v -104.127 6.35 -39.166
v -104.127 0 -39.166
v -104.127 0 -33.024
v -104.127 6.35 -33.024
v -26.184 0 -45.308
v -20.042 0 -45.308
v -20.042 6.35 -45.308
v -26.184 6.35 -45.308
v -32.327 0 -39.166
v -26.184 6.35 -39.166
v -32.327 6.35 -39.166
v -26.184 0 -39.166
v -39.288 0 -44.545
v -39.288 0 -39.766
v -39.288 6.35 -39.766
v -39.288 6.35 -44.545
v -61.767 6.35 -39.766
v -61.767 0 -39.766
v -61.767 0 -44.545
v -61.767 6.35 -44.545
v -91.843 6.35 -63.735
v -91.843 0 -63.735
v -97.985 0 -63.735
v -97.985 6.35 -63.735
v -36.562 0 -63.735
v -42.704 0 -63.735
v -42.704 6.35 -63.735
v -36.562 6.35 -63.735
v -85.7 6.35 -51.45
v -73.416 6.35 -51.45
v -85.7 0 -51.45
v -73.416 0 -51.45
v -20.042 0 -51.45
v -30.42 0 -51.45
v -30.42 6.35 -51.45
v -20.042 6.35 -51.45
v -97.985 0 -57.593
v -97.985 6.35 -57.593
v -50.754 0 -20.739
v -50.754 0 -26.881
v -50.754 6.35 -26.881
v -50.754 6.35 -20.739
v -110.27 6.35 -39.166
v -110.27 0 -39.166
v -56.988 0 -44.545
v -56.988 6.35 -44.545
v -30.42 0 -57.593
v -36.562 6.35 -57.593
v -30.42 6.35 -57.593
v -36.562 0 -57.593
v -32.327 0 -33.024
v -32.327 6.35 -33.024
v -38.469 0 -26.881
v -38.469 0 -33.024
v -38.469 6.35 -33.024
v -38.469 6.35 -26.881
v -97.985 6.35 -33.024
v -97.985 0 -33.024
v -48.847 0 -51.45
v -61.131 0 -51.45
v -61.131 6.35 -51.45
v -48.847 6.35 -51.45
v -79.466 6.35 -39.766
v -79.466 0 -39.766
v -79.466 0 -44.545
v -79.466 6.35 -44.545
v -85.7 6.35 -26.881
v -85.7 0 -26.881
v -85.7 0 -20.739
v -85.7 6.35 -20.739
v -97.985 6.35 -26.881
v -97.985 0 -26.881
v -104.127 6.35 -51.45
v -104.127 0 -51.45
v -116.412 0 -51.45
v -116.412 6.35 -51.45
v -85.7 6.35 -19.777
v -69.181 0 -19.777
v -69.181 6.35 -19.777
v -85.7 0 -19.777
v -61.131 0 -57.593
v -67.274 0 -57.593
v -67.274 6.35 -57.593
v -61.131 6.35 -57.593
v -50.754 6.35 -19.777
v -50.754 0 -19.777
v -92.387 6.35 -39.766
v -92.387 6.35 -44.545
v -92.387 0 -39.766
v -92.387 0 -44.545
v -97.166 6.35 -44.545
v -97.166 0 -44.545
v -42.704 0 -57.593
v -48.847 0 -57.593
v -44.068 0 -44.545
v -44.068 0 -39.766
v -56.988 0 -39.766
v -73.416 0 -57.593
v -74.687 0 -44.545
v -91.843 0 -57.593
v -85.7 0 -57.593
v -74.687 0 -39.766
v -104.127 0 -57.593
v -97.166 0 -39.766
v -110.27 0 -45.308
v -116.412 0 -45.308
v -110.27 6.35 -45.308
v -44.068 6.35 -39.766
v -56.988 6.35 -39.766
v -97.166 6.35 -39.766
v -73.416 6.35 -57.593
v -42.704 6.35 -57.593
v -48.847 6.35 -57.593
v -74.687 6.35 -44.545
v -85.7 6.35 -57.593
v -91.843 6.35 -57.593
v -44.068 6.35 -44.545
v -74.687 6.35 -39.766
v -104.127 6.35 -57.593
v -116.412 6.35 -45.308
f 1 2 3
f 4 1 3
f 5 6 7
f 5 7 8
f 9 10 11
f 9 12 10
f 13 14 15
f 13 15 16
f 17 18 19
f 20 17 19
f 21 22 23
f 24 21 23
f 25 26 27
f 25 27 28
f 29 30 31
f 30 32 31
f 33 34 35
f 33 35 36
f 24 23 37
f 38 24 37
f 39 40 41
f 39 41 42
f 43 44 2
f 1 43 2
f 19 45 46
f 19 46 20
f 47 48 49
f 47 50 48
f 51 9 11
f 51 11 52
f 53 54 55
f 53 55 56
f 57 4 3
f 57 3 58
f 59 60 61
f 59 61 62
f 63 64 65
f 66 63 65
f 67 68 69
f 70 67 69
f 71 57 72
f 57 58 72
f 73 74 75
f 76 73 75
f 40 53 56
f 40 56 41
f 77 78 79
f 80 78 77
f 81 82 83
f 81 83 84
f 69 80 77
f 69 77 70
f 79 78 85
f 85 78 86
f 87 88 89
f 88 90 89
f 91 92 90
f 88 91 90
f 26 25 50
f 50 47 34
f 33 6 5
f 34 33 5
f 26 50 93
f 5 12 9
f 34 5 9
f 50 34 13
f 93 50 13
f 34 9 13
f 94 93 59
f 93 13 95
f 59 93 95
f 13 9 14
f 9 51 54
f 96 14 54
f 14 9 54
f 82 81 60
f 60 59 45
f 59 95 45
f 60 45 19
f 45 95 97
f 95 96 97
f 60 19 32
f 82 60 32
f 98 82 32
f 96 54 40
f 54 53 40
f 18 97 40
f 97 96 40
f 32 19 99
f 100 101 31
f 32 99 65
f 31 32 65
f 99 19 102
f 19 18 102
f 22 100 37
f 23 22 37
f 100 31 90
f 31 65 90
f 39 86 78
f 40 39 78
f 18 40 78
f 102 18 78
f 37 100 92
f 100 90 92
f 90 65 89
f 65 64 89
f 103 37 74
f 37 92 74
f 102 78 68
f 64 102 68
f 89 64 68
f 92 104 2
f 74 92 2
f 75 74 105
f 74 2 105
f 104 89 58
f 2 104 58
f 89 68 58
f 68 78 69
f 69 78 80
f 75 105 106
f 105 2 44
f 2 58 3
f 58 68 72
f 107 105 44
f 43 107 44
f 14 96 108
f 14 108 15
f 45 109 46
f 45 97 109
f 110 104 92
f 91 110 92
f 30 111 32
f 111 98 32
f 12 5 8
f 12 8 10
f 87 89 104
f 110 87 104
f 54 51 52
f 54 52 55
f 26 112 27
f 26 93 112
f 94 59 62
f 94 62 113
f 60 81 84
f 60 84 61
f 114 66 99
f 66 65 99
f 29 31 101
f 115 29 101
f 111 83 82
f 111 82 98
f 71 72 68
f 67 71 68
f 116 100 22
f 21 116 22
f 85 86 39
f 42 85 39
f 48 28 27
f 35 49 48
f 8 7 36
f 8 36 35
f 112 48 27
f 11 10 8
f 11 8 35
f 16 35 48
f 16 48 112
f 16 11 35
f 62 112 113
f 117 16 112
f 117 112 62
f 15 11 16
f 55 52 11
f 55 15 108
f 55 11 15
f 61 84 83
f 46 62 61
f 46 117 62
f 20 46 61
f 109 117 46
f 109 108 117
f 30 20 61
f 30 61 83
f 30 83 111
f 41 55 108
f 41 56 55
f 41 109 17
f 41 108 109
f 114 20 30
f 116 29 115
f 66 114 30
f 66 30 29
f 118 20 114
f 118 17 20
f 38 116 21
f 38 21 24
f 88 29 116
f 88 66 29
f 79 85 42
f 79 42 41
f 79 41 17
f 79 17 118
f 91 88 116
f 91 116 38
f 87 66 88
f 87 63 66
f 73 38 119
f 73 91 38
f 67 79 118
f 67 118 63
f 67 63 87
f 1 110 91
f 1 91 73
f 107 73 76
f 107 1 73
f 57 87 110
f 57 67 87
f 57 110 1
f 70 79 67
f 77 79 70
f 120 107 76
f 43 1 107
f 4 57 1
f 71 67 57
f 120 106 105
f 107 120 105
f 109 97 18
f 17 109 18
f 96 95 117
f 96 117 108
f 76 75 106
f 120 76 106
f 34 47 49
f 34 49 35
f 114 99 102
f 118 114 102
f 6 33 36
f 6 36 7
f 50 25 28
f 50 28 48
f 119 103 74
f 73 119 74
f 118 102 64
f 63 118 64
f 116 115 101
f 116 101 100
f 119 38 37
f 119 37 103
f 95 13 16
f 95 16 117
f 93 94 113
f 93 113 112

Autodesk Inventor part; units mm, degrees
ref_plane "YZ Plane" through (0, 0, 0) normal (1, 0, 0) x (0, 1, 0)
ref_plane "XZ Plane" through (0, 0, 0) normal (0, 1, 0) x (-1, 0, 0)
ref_plane "XY Plane" through (0, 0, 0) normal (0, 0, 1) x (1, 0, 0)
sketch "Sketch1" plane through (0, 0, 0) normal (0, 1, 0) x (-1, 0, 0)
  line L0 (0, 0) -> (326.2264, 0) construction
  line L1 (326.2264, 0) -> (326.2264, -146.0251) construction
  line L2 (326.2264, -146.0251) -> (0, -146.0251) construction
  line L3 (0, -146.0251) -> (0, 0) construction
  line L4 (67.2736, -57.5928) -> (73.4159, -57.5928)
  line L5 (73.4159, -57.5928) -> (73.4159, -51.4505)
  line L6 (73.4159, -51.4505) -> (85.7005, -51.4505)
  line L7 (85.7005, -51.4505) -> (85.7005, -57.5928)
  line L8 (85.7005, -57.5928) -> (91.8428, -57.5928)
  line L9 (91.8428, -57.5928) -> (91.8428, -63.7351)
  line L10 (91.8428, -63.7351) -> (97.9851, -63.7351)
  line L11 (97.9851, -63.7351) -> (97.9851, -57.5928)
  line L12 (97.9851, -57.5928) -> (104.1274, -57.5928)
  line L13 (104.1274, -57.5928) -> (104.1274, -51.4505)
  line L14 (104.1274, -51.4505) -> (116.412, -51.4505)
  line L15 (116.412, -51.4505) -> (116.412, -45.3082)
  line L16 (116.412, -45.3082) -> (110.2697, -45.3082)
  line L17 (110.2697, -45.3082) -> (110.2697, -39.1659)
  line L18 (110.2697, -39.1659) -> (104.1274, -39.1659)
  line L19 (104.1274, -39.1659) -> (104.1274, -33.0236)
  line L20 (104.1274, -33.0236) -> (97.9851, -33.0236)
  line L21 (97.9851, -33.0236) -> (97.9851, -26.8813)
  line L22 (97.9851, -26.8813) -> (85.7005, -26.8813)
  line L23 (85.7005, -26.8813) -> (85.7005, -20.739)
  line L24 (69.1807, -19.7772) -> (85.7005, -19.7772)
  line L25 (85.7005, -19.7772) -> (85.7005, -20.739)
  line L26 (67.2736, -57.5928) -> (61.1313, -57.5928)
  line L27 (61.1313, -57.5928) -> (61.1313, -51.4505)
  line L28 (61.1313, -51.4505) -> (48.8467, -51.4505)
  line L29 (48.8467, -51.4505) -> (48.8467, -57.5928)
  line L30 (48.8467, -57.5928) -> (42.7043, -57.5928)
  line L31 (42.7043, -57.5928) -> (42.7043, -63.7351)
  line L32 (42.7043, -63.7351) -> (36.562, -63.7351)
  line L33 (36.562, -63.7351) -> (36.562, -57.5928)
  line L34 (36.562, -57.5928) -> (30.4197, -57.5928)
  line L35 (30.4197, -57.5928) -> (30.4197, -51.4505)
  line L36 (30.4197, -51.4505) -> (20.0422, -51.4505)
  line L37 (20.0422, -51.4505) -> (20.0422, -45.3082)
  line L38 (20.0422, -45.3082) -> (26.1845, -45.3082)
  line L39 (26.1845, -45.3082) -> (26.1845, -39.1659)
  line L40 (26.1845, -39.1659) -> (32.3268, -39.1659)
  line L41 (32.3268, -39.1659) -> (32.3268, -33.0236)
  line L42 (32.3268, -33.0236) -> (38.4691, -33.0236)
  line L43 (38.4691, -33.0236) -> (38.4691, -26.8813)
  line L44 (38.4691, -26.8813) -> (50.7538, -26.8813)
  line L45 (50.7538, -26.8813) -> (50.7538, -20.739)
  line L46 (69.1807, -19.7772) -> (50.7538, -19.7772)
  line L47 (50.7538, -19.7772) -> (50.7538, -20.739)
  line L48 (39.2885, -39.7662) -> (39.2885, -44.5453)
  line L49 (39.2885, -44.5453) -> (44.0675, -44.5453)
  line L50 (44.0675, -44.5453) -> (44.0675, -39.7662)
  line L51 (44.0675, -39.7662) -> (39.2885, -39.7662)
  line L52 (56.9879, -39.7662) -> (56.9879, -44.5453)
  line L53 (56.9879, -44.5453) -> (61.7669, -44.5453)
  line L54 (56.9879, -39.7662) -> (61.7669, -39.7662)
  line L55 (61.7669, -39.7662) -> (61.7669, -44.5453)
  line L56 (74.6873, -39.7662) -> (79.4663, -39.7662)
  line L57 (79.4663, -39.7662) -> (79.4663, -44.5453)
  line L58 (79.4663, -44.5453) -> (74.6873, -44.5453)
  line L59 (74.6873, -44.5453) -> (74.6873, -39.7662)
  line L60 (92.3867, -39.7662) -> (97.1657, -39.7662)
  line L61 (97.1657, -39.7662) -> (97.1657, -44.5453)
  line L62 (97.1657, -44.5453) -> (92.3867, -44.5453)
  line L63 (92.3867, -44.5453) -> (92.3867, -39.7662)
  dimension "d3" = 6.1423
  dimension "d6" = 6.1423
  dimension "d7" = 6.1423
  dimension "d8" = 6.1423
  dimension "d9" = 6.1423
  dimension "d10" = 6.1423
  dimension "d11" = 6.1423
  dimension "d12" = 6.1423
  dimension "d13" = 12.2846
  dimension "d14" = 12.2846
  dimension "d15" = 6.1423
  dimension "d16" = 6.1423
  dimension "d17" = 6.1423
  dimension "d18" = 6.1423
  dimension "d19" = 6.1423
  dimension "d20" = 12.2846
  dimension "d21" = 6.1423
  dimension "d22" = 6.1423
  dimension "d23" = 6.1423
  dimension "d29" = 12.9204
  dimension "d30" = 12.9204
  dimension "d31" = 13.104
  dimension "d32" = 13.104
  dimension "d33" = 12.9204
  dimension "d34" = 4.779
  dimension "d35" = 4.779
  dimension "d36" = 4.779
  dimension "d37" = 4.779
  dimension "d38" = 4.779
  dimension "d39" = 4.779
  dimension "d40" = 4.779
extrude "Extrusion1" add sketch "Sketch1" along normal blind 6.35
equation "\"d6\" = d3"
equation "\"d7\" = d6"
equation "\"d8\" = d3"
equation "\"d9\" = d7"
equation "\"d10\" = d7"
equation "\"d11\" = d10"
equation "\"d12\" = d6"
equation "\"d13\" = 2 * d3"
equation "\"d14\" = d13"
equation "\"d15\" = d6"
equation "\"d16\" = d11"
equation "\"d17\" = d16"
equation "\"d18\" = d17"
equation "\"d19\" = d17"
equation "\"d20\" = d13"
equation "\"d23\" = 0.5 * d13"
equation "\"d30\" = d29"
equation "\"d32\" = d31"
equation "\"d33\" = d30"
equation "\"d35\" = d34"
equation "\"d37\" = d35"
equation "\"d38\" = d36"
equation "\"d40\" = d38"
properties part number "Monster1"
